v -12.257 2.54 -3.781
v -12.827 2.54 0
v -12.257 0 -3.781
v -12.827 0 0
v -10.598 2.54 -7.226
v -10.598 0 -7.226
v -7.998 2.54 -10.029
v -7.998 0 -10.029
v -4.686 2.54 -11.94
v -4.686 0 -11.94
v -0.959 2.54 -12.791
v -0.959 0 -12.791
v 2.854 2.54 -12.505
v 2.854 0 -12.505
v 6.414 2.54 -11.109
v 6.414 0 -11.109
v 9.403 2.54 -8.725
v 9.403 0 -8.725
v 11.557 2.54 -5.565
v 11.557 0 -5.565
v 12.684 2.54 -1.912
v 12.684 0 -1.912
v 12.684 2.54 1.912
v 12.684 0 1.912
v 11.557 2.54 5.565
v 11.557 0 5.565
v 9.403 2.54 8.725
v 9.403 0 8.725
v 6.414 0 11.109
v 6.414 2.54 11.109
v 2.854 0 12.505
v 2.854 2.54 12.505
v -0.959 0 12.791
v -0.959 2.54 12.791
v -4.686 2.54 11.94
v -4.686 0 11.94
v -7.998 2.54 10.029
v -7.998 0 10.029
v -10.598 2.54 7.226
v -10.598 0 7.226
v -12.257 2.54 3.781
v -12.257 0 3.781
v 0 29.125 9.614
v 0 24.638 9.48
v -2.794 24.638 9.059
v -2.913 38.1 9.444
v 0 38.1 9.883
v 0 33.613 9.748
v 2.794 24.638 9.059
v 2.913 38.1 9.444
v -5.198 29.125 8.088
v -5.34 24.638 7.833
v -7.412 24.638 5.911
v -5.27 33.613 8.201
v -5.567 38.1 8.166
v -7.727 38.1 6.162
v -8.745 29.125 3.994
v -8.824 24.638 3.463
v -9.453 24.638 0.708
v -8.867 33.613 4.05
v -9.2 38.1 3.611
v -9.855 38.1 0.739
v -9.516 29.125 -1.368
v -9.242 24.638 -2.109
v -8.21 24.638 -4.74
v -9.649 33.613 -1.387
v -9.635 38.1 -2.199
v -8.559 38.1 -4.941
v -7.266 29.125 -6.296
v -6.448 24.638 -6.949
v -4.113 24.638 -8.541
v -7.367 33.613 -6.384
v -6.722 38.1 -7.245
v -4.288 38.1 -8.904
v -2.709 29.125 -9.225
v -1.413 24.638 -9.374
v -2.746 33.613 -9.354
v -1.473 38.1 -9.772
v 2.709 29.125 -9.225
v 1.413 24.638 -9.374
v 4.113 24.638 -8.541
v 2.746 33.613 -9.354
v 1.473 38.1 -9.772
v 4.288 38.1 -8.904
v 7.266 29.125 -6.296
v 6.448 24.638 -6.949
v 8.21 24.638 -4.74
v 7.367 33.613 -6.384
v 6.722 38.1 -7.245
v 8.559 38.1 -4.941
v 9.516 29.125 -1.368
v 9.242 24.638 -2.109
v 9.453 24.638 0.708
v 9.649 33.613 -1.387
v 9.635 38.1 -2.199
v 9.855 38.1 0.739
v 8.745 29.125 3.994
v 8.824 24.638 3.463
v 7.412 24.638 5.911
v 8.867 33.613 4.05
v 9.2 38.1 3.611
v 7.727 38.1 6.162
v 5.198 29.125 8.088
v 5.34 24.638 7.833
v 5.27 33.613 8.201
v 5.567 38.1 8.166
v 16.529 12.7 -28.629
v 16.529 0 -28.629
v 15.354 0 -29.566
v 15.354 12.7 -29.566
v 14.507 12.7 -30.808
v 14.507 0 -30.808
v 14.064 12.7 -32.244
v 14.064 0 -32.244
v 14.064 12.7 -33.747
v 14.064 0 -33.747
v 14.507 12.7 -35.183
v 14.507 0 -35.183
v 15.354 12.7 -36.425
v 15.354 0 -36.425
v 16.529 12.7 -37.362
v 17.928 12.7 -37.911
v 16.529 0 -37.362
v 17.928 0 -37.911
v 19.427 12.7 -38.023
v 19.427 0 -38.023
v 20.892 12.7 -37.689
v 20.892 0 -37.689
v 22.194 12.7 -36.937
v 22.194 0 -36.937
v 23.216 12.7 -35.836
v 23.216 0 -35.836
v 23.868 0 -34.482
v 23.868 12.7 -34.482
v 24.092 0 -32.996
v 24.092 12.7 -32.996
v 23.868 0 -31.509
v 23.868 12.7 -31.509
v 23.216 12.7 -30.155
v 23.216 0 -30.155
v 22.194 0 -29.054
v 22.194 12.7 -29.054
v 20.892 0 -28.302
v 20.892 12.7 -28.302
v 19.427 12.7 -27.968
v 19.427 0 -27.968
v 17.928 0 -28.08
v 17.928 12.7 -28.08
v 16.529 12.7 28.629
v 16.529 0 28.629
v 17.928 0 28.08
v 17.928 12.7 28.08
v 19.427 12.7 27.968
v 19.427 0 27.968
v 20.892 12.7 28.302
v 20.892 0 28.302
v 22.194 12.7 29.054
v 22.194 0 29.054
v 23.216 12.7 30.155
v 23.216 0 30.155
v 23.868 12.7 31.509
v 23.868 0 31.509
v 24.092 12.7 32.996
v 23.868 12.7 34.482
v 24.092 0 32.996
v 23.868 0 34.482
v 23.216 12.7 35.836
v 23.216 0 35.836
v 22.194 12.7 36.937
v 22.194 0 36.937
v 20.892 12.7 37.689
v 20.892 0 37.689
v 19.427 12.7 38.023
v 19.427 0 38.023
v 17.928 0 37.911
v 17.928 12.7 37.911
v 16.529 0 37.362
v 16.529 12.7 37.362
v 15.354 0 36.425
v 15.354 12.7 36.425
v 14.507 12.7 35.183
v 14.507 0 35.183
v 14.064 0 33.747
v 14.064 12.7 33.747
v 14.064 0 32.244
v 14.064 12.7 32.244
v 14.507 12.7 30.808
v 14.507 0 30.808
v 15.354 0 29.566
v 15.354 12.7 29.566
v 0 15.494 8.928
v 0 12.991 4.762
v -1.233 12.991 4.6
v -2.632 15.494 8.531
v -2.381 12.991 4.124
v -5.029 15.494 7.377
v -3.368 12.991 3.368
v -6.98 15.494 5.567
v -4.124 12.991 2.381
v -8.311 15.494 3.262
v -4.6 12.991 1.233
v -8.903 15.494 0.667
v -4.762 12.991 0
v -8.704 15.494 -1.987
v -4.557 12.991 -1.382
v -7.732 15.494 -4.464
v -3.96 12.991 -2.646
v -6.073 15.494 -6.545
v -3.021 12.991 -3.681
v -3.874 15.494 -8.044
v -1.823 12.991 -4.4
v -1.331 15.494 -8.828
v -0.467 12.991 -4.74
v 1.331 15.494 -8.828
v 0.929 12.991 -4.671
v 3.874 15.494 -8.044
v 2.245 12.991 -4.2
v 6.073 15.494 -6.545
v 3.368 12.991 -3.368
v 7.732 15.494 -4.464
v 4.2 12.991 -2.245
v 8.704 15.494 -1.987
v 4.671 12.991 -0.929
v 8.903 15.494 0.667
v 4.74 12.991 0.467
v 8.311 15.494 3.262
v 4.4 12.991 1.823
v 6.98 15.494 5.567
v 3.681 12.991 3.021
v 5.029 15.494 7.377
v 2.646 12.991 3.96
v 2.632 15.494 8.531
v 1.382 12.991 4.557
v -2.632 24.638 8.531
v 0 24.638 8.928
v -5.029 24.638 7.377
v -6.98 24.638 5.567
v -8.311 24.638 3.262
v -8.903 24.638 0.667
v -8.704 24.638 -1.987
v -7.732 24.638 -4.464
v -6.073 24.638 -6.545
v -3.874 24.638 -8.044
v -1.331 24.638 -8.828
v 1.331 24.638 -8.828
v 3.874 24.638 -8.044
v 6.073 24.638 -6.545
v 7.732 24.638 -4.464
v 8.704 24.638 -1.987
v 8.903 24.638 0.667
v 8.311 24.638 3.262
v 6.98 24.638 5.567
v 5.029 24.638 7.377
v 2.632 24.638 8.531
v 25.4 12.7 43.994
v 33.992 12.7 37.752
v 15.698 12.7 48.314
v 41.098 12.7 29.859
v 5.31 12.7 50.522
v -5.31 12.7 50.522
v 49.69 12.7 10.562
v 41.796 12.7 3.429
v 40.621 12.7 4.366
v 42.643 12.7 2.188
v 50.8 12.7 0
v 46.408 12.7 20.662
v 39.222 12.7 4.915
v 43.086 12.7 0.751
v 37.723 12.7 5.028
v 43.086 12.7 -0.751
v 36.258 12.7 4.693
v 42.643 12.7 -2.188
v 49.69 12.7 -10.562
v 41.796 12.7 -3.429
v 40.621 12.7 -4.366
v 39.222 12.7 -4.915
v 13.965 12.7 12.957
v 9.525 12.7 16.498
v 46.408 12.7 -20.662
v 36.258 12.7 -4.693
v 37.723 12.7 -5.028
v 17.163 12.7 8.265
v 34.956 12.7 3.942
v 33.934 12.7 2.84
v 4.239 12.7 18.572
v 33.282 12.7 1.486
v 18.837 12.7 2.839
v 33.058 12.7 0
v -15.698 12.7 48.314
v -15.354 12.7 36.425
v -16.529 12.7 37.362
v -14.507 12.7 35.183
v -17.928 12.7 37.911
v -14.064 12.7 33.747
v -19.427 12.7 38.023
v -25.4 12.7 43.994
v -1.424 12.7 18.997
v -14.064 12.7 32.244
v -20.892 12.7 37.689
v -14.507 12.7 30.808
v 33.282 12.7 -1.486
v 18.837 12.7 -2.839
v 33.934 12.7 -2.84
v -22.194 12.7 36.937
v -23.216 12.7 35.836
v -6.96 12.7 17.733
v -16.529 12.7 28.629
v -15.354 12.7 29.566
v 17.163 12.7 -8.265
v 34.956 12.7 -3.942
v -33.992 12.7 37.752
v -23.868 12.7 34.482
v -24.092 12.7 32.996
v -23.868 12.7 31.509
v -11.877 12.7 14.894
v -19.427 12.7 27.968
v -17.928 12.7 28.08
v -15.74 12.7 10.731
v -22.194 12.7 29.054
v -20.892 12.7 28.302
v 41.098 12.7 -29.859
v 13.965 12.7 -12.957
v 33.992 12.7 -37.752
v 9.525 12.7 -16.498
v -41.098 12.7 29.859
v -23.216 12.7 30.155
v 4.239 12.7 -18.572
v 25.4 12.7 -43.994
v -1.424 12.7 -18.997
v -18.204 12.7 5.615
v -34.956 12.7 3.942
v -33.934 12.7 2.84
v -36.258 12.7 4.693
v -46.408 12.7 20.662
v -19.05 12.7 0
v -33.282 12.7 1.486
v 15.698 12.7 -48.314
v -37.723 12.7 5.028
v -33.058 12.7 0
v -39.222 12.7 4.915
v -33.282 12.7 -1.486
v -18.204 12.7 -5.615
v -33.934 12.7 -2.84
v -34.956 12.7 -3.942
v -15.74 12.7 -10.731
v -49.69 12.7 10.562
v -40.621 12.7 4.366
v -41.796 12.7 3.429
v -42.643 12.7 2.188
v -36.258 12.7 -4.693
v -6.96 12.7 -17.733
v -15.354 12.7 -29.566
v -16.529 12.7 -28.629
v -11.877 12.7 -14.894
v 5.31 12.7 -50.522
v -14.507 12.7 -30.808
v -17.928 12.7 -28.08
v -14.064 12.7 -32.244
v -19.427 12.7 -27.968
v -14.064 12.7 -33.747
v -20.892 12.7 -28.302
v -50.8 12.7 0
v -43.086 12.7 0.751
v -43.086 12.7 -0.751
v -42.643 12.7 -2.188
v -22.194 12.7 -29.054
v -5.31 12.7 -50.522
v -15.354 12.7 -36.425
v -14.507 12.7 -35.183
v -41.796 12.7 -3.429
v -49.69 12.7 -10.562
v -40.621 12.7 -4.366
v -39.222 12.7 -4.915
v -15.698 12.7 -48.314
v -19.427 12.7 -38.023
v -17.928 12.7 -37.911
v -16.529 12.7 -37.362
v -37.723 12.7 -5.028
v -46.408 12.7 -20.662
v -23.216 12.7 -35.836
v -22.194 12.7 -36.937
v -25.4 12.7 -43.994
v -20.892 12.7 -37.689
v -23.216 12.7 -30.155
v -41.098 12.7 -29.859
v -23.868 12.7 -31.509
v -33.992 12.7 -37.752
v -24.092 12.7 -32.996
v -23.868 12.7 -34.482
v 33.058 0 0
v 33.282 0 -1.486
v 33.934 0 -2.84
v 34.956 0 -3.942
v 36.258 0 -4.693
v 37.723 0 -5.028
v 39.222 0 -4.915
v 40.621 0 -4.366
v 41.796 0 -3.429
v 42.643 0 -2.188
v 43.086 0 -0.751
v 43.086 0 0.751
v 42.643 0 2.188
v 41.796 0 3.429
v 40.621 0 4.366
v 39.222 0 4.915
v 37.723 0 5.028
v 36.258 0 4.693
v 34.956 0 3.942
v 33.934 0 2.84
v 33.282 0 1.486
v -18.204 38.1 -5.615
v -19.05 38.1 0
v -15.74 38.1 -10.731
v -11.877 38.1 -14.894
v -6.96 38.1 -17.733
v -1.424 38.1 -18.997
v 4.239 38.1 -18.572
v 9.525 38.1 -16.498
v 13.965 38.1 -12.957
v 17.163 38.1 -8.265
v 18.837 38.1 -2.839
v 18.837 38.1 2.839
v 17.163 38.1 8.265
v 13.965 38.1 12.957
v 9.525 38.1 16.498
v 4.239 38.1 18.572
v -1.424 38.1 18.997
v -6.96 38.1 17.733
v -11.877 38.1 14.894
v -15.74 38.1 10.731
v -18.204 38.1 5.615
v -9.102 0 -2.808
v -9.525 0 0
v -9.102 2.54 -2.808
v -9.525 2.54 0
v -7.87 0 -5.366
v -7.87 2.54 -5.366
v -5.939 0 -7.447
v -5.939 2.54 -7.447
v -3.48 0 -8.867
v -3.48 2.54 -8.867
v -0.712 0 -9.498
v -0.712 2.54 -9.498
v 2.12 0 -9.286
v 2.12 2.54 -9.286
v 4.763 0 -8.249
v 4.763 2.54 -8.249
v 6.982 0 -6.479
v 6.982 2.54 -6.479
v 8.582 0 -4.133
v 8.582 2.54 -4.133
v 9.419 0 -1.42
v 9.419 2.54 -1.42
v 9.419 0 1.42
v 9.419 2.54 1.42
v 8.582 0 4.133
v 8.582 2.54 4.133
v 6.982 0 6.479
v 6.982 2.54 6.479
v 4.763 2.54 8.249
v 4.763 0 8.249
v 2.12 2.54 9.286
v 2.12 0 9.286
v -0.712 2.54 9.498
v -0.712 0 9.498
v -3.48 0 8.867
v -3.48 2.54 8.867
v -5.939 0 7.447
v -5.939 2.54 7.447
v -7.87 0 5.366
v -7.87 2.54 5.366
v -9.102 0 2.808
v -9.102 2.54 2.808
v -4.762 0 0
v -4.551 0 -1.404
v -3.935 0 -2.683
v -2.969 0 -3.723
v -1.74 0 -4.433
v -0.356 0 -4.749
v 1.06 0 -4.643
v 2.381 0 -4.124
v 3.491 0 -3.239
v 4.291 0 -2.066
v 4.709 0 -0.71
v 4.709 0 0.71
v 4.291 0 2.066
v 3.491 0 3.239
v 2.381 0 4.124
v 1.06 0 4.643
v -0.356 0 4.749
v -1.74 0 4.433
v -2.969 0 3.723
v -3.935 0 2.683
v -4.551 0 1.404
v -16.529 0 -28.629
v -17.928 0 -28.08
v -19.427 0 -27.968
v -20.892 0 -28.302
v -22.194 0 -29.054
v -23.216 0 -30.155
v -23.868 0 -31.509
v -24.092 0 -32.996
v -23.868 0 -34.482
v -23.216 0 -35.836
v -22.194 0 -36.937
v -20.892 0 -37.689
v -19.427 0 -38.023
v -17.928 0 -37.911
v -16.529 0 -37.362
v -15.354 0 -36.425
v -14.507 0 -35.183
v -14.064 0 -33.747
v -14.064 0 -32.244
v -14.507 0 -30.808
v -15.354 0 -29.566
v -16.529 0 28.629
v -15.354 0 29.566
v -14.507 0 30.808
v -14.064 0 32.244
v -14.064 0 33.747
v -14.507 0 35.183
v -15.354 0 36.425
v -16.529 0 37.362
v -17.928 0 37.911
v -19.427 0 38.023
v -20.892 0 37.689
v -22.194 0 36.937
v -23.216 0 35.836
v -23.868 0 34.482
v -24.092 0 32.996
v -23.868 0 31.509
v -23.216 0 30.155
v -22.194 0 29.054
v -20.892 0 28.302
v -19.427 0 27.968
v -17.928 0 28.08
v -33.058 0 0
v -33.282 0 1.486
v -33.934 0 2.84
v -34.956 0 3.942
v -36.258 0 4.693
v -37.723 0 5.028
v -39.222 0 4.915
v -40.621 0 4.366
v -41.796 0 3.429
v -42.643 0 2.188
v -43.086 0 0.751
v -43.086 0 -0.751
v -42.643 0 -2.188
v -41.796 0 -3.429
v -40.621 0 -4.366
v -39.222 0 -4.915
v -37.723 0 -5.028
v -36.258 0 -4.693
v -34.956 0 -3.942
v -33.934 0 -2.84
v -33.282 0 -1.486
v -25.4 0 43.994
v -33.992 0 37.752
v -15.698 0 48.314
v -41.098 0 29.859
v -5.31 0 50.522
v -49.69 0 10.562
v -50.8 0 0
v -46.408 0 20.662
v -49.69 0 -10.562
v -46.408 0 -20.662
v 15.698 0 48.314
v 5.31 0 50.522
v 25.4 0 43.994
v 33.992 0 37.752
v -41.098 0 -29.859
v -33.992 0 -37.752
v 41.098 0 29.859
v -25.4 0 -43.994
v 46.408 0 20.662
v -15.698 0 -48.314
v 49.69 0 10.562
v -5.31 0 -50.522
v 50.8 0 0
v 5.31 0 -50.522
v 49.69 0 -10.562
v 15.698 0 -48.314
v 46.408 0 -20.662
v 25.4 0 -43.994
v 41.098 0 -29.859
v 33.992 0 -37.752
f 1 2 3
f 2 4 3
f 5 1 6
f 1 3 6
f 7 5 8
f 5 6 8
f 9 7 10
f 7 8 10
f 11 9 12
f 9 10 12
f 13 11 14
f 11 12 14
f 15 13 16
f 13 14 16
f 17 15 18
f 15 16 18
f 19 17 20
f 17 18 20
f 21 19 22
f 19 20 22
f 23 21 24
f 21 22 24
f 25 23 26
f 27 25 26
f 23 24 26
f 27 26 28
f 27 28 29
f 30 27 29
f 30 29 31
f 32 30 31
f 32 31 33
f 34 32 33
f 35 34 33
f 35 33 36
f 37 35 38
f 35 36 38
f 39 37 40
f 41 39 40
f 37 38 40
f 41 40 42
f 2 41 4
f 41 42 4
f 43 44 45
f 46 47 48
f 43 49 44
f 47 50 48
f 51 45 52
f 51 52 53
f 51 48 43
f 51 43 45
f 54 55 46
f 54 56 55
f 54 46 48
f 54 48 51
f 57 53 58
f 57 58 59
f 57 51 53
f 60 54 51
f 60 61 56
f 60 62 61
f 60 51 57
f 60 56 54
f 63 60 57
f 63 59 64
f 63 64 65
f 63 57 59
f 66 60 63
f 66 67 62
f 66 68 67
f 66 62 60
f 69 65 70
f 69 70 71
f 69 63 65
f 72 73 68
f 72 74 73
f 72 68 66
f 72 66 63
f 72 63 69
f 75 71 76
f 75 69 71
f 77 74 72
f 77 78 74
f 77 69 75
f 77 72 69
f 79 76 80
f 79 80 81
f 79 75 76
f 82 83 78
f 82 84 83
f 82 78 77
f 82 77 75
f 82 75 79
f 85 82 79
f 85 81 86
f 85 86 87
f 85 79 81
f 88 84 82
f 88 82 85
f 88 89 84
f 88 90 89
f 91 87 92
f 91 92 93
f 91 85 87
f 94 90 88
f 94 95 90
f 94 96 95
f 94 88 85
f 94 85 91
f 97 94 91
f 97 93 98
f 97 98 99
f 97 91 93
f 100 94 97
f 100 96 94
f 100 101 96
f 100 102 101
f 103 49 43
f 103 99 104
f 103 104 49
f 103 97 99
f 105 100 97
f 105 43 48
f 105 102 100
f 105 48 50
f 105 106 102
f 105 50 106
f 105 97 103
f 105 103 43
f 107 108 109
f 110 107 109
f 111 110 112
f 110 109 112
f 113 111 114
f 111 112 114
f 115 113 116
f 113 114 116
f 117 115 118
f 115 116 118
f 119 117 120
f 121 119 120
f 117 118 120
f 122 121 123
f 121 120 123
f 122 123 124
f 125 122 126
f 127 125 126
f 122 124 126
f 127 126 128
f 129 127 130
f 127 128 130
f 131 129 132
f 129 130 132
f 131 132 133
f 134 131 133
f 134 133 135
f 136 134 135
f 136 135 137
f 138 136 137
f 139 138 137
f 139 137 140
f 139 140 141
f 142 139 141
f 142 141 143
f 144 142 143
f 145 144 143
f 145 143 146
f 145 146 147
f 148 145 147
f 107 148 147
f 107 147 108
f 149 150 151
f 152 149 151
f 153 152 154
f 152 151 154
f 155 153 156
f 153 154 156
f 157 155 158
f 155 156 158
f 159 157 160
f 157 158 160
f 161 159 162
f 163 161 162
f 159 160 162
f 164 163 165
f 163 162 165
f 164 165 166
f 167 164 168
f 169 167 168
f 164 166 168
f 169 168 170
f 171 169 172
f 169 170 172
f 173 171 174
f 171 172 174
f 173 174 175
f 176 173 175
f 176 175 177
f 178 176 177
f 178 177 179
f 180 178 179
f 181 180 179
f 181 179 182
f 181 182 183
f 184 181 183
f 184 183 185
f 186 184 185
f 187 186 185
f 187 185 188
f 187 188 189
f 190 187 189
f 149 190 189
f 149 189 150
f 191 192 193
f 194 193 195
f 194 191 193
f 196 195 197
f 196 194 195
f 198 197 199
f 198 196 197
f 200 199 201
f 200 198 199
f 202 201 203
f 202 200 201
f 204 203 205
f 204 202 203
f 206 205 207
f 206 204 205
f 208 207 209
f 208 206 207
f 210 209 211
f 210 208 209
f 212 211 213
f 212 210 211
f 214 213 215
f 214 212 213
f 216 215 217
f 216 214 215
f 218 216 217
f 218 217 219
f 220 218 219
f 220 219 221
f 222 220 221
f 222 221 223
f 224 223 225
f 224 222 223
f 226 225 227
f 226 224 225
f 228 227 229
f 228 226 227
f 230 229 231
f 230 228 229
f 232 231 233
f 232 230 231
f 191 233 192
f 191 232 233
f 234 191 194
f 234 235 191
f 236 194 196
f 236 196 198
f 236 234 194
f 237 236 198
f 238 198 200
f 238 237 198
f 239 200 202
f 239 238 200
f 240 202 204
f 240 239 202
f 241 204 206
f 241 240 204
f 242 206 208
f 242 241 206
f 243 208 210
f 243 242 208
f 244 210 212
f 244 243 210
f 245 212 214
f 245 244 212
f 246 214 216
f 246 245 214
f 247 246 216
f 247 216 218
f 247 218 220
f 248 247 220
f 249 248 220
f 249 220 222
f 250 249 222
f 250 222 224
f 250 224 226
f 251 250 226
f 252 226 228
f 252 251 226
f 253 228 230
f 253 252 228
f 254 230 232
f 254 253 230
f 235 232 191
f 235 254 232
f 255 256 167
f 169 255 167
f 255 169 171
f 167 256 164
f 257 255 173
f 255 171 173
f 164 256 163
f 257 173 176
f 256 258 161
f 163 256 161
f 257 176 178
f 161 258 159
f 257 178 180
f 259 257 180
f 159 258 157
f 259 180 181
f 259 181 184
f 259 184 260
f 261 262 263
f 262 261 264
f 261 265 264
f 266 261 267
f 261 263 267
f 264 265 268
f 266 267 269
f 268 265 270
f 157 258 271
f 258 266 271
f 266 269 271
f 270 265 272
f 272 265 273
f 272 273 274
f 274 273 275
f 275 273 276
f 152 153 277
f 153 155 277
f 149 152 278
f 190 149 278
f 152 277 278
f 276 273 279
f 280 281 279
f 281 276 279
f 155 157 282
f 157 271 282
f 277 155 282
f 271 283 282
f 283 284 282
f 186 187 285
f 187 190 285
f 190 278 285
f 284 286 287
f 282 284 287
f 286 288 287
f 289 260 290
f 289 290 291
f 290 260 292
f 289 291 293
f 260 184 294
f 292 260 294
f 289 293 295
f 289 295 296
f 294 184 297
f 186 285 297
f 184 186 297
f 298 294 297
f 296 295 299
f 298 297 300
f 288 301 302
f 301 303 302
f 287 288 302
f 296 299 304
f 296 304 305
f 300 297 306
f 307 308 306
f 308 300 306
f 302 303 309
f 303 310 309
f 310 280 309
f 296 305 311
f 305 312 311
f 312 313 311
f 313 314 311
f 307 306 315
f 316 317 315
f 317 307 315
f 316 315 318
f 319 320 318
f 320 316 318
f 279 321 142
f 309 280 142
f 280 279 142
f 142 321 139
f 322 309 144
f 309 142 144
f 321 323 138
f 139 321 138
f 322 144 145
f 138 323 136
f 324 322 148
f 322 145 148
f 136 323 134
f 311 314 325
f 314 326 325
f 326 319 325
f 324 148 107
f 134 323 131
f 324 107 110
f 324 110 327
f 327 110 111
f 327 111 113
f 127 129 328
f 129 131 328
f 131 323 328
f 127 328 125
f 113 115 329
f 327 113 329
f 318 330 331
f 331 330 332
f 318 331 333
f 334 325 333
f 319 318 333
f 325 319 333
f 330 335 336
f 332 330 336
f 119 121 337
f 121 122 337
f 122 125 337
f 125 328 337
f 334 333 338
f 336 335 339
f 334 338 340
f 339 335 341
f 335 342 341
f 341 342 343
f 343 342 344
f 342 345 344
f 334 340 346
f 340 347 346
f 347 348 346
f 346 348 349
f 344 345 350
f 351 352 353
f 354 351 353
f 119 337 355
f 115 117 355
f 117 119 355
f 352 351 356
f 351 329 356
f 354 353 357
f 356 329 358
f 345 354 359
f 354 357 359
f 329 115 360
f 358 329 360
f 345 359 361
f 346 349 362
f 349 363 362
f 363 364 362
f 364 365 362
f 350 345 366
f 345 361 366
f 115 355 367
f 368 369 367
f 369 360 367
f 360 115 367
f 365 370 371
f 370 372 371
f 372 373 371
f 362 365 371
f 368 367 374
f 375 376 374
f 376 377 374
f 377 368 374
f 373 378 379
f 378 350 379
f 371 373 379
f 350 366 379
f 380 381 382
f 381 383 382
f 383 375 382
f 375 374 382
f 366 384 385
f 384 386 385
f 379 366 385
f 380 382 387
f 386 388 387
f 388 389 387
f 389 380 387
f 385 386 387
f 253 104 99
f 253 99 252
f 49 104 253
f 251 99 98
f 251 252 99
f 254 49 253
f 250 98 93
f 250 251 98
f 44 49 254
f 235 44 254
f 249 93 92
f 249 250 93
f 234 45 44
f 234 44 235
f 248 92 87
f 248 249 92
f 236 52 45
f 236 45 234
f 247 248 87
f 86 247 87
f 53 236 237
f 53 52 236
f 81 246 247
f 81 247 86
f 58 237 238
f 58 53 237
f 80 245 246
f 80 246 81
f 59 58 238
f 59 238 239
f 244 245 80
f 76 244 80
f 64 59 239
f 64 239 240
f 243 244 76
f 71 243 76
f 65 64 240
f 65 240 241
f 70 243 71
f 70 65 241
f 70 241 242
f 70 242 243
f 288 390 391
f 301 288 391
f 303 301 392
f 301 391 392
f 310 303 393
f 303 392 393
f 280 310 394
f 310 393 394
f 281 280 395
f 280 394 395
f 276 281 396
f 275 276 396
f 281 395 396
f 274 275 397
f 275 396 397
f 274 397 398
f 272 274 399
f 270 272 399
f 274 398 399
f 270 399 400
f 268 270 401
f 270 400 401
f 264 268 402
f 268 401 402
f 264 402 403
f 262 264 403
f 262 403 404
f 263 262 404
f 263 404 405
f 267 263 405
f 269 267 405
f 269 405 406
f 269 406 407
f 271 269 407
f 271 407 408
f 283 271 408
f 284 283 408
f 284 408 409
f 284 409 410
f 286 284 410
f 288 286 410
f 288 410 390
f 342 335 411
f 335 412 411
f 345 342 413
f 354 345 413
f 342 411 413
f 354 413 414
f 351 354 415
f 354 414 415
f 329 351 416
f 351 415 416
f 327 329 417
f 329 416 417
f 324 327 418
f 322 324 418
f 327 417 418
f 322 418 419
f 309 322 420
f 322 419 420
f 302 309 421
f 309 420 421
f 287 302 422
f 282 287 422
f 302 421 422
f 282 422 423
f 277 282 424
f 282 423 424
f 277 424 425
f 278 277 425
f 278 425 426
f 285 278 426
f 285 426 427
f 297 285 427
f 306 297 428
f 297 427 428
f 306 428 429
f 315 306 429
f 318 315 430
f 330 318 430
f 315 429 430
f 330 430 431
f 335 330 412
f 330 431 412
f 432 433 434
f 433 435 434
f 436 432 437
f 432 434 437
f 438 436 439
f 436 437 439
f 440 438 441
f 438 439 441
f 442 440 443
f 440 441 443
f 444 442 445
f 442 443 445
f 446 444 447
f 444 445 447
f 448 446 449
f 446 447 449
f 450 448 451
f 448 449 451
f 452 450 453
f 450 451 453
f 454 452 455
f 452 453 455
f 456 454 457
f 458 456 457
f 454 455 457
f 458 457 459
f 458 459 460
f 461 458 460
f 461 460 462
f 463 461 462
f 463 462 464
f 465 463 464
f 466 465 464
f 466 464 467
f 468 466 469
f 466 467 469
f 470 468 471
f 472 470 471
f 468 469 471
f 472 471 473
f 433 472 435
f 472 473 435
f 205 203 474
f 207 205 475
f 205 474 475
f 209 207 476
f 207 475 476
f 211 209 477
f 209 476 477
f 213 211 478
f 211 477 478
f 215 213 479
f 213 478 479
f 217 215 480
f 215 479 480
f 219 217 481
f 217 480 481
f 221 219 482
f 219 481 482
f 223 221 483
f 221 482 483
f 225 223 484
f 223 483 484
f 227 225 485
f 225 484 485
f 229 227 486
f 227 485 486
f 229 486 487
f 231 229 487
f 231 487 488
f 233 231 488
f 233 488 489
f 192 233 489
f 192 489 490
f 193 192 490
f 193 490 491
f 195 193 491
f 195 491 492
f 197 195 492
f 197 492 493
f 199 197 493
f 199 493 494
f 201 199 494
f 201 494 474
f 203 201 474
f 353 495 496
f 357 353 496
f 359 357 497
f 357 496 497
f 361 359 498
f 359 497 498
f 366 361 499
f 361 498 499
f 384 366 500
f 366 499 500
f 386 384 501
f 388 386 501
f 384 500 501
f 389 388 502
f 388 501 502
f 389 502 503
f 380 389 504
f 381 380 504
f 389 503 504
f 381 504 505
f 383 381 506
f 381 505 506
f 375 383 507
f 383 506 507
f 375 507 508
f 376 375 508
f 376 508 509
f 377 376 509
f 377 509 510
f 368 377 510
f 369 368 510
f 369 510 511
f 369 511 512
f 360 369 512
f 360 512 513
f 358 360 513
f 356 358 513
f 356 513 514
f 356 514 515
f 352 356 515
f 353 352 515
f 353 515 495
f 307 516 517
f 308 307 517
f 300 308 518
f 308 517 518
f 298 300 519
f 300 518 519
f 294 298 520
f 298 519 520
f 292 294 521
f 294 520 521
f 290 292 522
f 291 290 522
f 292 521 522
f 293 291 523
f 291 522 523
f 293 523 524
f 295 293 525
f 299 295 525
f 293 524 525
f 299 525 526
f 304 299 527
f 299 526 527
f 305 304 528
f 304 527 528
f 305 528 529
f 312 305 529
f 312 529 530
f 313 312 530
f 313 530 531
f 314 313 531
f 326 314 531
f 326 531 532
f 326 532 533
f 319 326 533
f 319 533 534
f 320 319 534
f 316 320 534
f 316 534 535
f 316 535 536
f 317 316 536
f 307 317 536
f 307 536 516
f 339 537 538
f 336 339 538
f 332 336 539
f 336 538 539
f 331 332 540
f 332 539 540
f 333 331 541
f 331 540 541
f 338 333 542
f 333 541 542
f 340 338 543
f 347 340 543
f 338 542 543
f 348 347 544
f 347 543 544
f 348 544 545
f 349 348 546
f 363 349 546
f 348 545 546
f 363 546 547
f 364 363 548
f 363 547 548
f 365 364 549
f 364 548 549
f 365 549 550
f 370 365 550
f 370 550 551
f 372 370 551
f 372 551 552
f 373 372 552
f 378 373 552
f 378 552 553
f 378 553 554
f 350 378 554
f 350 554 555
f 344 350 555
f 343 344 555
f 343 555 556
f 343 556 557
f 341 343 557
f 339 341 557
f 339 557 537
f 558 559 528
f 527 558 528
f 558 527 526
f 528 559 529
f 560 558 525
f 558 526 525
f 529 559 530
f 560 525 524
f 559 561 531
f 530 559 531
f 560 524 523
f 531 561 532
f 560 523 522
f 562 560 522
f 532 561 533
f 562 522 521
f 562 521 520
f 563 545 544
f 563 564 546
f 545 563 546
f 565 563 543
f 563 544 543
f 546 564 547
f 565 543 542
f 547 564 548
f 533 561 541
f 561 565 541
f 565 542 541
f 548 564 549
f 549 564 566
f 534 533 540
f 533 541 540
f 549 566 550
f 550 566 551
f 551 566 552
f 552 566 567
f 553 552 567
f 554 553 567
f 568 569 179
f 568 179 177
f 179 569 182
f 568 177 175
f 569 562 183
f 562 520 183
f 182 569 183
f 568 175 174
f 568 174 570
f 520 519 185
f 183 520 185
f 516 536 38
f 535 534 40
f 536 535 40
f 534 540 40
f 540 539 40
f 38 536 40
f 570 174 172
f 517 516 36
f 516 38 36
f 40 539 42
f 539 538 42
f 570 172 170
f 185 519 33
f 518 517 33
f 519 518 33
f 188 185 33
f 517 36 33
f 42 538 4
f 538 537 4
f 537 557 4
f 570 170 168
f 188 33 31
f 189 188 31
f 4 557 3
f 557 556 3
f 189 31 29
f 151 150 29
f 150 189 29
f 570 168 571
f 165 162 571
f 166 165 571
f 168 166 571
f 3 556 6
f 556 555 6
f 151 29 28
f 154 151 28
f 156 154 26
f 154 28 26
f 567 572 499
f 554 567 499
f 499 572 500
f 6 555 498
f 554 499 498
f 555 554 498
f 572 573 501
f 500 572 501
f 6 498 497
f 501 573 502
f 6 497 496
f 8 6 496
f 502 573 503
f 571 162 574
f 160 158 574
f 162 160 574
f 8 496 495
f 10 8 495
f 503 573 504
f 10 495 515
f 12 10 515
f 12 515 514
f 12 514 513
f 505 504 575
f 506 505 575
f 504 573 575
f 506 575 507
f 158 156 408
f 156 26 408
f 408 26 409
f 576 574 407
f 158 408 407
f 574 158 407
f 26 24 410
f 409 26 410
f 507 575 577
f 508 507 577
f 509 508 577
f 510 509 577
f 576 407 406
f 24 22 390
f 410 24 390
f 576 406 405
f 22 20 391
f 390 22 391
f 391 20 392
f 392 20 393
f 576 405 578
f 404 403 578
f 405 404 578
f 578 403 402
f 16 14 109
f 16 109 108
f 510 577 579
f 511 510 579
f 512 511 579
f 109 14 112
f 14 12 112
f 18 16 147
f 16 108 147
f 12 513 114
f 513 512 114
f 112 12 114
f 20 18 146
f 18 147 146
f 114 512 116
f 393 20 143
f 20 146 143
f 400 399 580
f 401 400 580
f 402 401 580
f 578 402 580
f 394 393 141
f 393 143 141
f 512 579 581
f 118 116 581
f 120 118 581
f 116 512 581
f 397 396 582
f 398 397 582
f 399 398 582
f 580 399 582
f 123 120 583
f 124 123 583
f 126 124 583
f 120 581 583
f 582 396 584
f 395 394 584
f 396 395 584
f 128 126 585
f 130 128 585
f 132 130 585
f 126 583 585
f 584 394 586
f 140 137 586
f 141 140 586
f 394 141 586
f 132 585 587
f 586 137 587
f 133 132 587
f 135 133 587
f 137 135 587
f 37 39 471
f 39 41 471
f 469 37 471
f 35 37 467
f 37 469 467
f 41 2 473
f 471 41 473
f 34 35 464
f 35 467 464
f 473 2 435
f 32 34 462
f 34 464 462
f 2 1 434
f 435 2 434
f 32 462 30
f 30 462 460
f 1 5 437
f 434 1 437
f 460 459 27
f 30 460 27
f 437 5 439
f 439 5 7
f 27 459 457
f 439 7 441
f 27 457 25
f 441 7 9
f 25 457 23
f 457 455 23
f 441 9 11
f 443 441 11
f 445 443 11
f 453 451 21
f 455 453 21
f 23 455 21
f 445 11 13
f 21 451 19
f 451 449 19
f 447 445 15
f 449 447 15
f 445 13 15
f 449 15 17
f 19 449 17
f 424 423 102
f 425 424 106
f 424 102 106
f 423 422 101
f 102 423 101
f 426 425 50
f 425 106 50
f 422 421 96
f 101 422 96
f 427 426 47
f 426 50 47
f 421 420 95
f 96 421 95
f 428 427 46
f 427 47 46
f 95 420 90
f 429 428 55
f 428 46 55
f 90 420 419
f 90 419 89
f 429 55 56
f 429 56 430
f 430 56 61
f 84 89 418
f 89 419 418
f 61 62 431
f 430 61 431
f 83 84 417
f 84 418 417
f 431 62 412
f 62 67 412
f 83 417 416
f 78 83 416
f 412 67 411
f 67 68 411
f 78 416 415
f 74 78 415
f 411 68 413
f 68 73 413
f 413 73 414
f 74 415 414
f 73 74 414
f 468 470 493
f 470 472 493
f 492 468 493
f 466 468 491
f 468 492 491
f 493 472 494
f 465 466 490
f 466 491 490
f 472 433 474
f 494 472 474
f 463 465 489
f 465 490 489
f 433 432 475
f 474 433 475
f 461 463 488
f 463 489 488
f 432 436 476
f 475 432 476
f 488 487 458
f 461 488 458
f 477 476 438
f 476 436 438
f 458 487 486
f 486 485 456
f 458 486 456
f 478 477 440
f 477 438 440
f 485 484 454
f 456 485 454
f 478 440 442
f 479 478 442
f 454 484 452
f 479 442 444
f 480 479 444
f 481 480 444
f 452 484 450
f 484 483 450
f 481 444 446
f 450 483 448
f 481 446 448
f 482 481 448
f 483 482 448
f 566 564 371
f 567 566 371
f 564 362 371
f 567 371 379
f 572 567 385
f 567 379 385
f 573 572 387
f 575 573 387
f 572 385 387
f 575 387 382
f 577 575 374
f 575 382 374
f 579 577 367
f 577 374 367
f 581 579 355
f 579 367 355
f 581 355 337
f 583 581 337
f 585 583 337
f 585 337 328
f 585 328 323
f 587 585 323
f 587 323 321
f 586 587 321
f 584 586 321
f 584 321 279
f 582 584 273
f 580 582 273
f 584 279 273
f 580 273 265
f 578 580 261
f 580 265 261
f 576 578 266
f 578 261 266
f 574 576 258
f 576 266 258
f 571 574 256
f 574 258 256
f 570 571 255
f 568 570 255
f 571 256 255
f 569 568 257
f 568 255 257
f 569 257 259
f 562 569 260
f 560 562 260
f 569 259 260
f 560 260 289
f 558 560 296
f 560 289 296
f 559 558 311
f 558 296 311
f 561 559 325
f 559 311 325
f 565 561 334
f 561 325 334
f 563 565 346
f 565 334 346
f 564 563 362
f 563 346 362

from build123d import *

# Parameters (mm, degrees)
F_3_8_0_375_DIAMETER_HOLE1_D = 9.525
F_3_8_CLEARANCE_HOLE1_D      = 10.0838
CIRPATTERN1_COUNT            = 6


with BuildPart() as part:
    # Sketch1 → Revolve1 (revolve)
    with BuildSketch(Plane.XY):
        Polygon((-12.827, 0), (-50.8, 0), (-50.8, 12.7), (-19.05, 12.7), (-19.05, 38.1), (0, 38.1), (0, 0), (-9.525, 0), (-9.525, 2.54), (-12.827, 2.54), align=None)
    revolve(axis=Axis((0, 38.1, 0), (0, -1, 0)))

    # 3/8 (0.375) Diameter Hole1 (through all)
    with Locations(Plane(origin=(0, 38.1, 0), x_dir=(1, 0, 0), z_dir=(0, 1, 0))):
        with Locations((0, 0)):
            Hole(F_3_8_0_375_DIAMETER_HOLE1_D / 2)

    # Sketch3 → 1/2 NPT Tapped Hole1 (revolve, cut)
    with BuildSketch(Plane(origin=(0, 38.1, 0), x_dir=(0, 0, 1), z_dir=(1, 0, 0))):
        Polygon((0, 0), (0, 27.970543693), (8.9281, 22.606), (8.9281, 13.462), (9.479726792, 13.462), (9.8827971, 0), align=None)
    revolve(axis=Axis((0, 44.45, 0), (0, -1, 0)), mode=Mode.SUBTRACT)

    # 3/8 Clearance Hole1 (through all)
    with Locations(Plane(origin=(0, 12.7, 0), x_dir=(1, 0, 0), z_dir=(0, 1, 0))):
        with Locations((38.1, 0)):
            f_3_8_clearance_hole1 = Hole(F_3_8_CLEARANCE_HOLE1_D / 2)

    # CirPattern1: 3/8 Clearance Hole1 ×6 about axis
    cirpattern1_axis = Axis((0, 0, 0), (0, 1, 0))
    for i in range(1, CIRPATTERN1_COUNT):
        add(f_3_8_clearance_hole1.rotate(cirpattern1_axis, i * 360 / CIRPATTERN1_COUNT), mode=Mode.SUBTRACT)


solid = part.part
